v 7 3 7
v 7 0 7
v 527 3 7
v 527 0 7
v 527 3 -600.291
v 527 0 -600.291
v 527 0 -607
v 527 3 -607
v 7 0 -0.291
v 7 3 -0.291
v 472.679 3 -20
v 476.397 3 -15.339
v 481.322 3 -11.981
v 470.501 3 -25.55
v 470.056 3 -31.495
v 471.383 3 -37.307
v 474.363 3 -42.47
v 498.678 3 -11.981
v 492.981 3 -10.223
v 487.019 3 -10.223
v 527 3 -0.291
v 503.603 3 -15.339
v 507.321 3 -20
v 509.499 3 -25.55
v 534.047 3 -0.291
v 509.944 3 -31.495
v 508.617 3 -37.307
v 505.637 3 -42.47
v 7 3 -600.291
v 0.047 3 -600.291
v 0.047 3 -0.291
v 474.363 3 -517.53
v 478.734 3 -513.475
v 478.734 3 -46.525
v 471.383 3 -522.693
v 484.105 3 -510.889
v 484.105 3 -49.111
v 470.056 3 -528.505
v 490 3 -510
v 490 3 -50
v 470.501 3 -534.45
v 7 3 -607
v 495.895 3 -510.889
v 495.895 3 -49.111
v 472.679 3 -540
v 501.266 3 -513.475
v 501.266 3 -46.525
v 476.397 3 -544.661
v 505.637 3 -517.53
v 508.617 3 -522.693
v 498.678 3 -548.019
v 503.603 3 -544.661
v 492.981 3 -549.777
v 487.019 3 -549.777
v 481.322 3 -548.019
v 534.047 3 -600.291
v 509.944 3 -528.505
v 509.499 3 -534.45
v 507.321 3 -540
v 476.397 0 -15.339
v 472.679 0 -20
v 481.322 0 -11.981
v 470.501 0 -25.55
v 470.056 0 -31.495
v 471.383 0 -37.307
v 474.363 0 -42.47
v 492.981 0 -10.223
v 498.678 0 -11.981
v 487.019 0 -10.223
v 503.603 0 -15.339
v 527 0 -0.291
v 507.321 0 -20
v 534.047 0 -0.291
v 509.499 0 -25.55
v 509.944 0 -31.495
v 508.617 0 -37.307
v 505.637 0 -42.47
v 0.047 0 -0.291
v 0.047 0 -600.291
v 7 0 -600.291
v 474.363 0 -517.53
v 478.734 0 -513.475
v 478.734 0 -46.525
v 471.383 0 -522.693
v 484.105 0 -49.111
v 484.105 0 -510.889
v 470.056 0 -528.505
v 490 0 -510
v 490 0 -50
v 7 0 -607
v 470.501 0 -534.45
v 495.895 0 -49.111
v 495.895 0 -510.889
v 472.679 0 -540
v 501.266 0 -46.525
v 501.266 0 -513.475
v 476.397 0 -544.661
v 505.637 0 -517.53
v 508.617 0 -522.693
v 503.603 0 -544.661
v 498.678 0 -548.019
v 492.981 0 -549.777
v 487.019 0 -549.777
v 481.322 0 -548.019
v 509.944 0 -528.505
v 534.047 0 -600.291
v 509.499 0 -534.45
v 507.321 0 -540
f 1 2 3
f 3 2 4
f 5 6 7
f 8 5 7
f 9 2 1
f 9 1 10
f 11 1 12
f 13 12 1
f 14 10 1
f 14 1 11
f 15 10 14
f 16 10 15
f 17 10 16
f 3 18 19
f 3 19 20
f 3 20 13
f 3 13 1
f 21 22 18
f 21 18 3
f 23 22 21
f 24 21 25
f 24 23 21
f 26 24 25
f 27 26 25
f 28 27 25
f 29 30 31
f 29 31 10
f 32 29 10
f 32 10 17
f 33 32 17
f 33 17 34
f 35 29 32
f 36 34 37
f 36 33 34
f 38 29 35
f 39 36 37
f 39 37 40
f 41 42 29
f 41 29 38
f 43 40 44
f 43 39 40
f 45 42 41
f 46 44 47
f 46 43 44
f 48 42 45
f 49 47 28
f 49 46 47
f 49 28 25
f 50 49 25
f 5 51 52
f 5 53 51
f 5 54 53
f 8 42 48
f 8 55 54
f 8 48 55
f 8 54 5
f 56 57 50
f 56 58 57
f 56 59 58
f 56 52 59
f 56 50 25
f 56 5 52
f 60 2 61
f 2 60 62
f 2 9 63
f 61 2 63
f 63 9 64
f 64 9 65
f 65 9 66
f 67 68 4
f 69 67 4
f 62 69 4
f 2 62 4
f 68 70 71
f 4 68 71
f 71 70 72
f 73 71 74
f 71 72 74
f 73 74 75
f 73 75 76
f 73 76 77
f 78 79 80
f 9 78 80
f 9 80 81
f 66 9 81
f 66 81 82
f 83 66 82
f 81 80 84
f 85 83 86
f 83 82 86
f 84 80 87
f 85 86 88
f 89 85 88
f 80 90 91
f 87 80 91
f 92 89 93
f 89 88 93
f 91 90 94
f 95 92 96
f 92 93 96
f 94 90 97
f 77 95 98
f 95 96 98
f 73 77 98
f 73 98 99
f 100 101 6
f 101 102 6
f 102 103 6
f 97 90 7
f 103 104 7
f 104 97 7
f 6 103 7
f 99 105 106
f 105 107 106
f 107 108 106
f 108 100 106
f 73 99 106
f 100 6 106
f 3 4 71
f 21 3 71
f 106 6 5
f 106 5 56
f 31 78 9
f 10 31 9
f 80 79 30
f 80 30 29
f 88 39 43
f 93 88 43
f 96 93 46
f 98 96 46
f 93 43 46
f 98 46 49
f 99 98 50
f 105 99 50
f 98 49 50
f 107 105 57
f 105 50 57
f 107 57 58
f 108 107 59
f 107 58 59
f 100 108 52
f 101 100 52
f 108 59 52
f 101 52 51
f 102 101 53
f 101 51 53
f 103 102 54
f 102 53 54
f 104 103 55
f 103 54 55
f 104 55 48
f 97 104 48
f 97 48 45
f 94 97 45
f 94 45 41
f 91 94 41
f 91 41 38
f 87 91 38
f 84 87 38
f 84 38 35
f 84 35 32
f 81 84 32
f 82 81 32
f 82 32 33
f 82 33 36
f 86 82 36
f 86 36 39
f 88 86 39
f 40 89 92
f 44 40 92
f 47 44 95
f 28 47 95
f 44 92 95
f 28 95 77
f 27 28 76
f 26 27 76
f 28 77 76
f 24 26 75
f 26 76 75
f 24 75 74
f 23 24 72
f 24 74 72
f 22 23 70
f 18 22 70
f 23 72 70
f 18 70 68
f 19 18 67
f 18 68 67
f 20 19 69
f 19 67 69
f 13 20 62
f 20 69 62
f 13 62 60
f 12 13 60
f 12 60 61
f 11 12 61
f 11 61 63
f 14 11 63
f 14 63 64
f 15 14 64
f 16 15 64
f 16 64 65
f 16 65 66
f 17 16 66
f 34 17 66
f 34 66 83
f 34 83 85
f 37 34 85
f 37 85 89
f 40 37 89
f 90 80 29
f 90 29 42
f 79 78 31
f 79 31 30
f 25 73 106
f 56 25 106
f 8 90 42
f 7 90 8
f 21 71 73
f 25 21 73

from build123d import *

# Parameters (mm, degrees)
SKETCH1_W           = 534
SKETCH1_H           = 600
BOSS_EXTRUDE1_DEPTH = 3
SKETCH3_W           = 520
SKETCH3_H           = 614
BOSS_EXTRUDE2_DEPTH = 3
SKETCH4_R           = 20
CUT_EXTRUDE5_DEPTH  = 10
SKETCH5_R           = 20
CUT_EXTRUDE7_DEPTH  = 10


with BuildPart() as part:
    # Sketch1 → Boss-Extrude1 (new body)
    with BuildSketch(Plane(origin=(0, 0, 0), x_dir=(1, 0, 0), z_dir=(0, 1, 0))):
        with Locations((267.046520854, 300.291126183)):
            Rectangle(SKETCH1_W, SKETCH1_H)
    extrude(amount=BOSS_EXTRUDE1_DEPTH)

    # Sketch3 → Boss-Extrude2 (add)
    with BuildSketch(Plane(origin=(0, 0, 0), x_dir=(1, 0, 0), z_dir=(0, 1, 0))):
        with Locations((267, 300)):
            Rectangle(SKETCH3_W, SKETCH3_H)
    extrude(amount=BOSS_EXTRUDE2_DEPTH)

    # Sketch4 → Cut-Extrude5 (cut)
    with BuildSketch(Plane(origin=(0, 3, 0), x_dir=(1, 0, 0), z_dir=(0, 1, 0))):
        with Locations(Location((490, 530, 0), (0, 0, 270))):
            Circle(SKETCH4_R)
    extrude(amount=-CUT_EXTRUDE5_DEPTH, mode=Mode.SUBTRACT)

    # Sketch5 → Cut-Extrude7 (cut)
    with BuildSketch(Plane(origin=(0, 0, 0), x_dir=(-1, 0, 0), z_dir=(0, -1, 0))):
        with Locations(Location((-490, 30, 0), (0, 0, 90))):
            Circle(SKETCH5_R)
    extrude(amount=-CUT_EXTRUDE7_DEPTH, mode=Mode.SUBTRACT)


solid = part.part
